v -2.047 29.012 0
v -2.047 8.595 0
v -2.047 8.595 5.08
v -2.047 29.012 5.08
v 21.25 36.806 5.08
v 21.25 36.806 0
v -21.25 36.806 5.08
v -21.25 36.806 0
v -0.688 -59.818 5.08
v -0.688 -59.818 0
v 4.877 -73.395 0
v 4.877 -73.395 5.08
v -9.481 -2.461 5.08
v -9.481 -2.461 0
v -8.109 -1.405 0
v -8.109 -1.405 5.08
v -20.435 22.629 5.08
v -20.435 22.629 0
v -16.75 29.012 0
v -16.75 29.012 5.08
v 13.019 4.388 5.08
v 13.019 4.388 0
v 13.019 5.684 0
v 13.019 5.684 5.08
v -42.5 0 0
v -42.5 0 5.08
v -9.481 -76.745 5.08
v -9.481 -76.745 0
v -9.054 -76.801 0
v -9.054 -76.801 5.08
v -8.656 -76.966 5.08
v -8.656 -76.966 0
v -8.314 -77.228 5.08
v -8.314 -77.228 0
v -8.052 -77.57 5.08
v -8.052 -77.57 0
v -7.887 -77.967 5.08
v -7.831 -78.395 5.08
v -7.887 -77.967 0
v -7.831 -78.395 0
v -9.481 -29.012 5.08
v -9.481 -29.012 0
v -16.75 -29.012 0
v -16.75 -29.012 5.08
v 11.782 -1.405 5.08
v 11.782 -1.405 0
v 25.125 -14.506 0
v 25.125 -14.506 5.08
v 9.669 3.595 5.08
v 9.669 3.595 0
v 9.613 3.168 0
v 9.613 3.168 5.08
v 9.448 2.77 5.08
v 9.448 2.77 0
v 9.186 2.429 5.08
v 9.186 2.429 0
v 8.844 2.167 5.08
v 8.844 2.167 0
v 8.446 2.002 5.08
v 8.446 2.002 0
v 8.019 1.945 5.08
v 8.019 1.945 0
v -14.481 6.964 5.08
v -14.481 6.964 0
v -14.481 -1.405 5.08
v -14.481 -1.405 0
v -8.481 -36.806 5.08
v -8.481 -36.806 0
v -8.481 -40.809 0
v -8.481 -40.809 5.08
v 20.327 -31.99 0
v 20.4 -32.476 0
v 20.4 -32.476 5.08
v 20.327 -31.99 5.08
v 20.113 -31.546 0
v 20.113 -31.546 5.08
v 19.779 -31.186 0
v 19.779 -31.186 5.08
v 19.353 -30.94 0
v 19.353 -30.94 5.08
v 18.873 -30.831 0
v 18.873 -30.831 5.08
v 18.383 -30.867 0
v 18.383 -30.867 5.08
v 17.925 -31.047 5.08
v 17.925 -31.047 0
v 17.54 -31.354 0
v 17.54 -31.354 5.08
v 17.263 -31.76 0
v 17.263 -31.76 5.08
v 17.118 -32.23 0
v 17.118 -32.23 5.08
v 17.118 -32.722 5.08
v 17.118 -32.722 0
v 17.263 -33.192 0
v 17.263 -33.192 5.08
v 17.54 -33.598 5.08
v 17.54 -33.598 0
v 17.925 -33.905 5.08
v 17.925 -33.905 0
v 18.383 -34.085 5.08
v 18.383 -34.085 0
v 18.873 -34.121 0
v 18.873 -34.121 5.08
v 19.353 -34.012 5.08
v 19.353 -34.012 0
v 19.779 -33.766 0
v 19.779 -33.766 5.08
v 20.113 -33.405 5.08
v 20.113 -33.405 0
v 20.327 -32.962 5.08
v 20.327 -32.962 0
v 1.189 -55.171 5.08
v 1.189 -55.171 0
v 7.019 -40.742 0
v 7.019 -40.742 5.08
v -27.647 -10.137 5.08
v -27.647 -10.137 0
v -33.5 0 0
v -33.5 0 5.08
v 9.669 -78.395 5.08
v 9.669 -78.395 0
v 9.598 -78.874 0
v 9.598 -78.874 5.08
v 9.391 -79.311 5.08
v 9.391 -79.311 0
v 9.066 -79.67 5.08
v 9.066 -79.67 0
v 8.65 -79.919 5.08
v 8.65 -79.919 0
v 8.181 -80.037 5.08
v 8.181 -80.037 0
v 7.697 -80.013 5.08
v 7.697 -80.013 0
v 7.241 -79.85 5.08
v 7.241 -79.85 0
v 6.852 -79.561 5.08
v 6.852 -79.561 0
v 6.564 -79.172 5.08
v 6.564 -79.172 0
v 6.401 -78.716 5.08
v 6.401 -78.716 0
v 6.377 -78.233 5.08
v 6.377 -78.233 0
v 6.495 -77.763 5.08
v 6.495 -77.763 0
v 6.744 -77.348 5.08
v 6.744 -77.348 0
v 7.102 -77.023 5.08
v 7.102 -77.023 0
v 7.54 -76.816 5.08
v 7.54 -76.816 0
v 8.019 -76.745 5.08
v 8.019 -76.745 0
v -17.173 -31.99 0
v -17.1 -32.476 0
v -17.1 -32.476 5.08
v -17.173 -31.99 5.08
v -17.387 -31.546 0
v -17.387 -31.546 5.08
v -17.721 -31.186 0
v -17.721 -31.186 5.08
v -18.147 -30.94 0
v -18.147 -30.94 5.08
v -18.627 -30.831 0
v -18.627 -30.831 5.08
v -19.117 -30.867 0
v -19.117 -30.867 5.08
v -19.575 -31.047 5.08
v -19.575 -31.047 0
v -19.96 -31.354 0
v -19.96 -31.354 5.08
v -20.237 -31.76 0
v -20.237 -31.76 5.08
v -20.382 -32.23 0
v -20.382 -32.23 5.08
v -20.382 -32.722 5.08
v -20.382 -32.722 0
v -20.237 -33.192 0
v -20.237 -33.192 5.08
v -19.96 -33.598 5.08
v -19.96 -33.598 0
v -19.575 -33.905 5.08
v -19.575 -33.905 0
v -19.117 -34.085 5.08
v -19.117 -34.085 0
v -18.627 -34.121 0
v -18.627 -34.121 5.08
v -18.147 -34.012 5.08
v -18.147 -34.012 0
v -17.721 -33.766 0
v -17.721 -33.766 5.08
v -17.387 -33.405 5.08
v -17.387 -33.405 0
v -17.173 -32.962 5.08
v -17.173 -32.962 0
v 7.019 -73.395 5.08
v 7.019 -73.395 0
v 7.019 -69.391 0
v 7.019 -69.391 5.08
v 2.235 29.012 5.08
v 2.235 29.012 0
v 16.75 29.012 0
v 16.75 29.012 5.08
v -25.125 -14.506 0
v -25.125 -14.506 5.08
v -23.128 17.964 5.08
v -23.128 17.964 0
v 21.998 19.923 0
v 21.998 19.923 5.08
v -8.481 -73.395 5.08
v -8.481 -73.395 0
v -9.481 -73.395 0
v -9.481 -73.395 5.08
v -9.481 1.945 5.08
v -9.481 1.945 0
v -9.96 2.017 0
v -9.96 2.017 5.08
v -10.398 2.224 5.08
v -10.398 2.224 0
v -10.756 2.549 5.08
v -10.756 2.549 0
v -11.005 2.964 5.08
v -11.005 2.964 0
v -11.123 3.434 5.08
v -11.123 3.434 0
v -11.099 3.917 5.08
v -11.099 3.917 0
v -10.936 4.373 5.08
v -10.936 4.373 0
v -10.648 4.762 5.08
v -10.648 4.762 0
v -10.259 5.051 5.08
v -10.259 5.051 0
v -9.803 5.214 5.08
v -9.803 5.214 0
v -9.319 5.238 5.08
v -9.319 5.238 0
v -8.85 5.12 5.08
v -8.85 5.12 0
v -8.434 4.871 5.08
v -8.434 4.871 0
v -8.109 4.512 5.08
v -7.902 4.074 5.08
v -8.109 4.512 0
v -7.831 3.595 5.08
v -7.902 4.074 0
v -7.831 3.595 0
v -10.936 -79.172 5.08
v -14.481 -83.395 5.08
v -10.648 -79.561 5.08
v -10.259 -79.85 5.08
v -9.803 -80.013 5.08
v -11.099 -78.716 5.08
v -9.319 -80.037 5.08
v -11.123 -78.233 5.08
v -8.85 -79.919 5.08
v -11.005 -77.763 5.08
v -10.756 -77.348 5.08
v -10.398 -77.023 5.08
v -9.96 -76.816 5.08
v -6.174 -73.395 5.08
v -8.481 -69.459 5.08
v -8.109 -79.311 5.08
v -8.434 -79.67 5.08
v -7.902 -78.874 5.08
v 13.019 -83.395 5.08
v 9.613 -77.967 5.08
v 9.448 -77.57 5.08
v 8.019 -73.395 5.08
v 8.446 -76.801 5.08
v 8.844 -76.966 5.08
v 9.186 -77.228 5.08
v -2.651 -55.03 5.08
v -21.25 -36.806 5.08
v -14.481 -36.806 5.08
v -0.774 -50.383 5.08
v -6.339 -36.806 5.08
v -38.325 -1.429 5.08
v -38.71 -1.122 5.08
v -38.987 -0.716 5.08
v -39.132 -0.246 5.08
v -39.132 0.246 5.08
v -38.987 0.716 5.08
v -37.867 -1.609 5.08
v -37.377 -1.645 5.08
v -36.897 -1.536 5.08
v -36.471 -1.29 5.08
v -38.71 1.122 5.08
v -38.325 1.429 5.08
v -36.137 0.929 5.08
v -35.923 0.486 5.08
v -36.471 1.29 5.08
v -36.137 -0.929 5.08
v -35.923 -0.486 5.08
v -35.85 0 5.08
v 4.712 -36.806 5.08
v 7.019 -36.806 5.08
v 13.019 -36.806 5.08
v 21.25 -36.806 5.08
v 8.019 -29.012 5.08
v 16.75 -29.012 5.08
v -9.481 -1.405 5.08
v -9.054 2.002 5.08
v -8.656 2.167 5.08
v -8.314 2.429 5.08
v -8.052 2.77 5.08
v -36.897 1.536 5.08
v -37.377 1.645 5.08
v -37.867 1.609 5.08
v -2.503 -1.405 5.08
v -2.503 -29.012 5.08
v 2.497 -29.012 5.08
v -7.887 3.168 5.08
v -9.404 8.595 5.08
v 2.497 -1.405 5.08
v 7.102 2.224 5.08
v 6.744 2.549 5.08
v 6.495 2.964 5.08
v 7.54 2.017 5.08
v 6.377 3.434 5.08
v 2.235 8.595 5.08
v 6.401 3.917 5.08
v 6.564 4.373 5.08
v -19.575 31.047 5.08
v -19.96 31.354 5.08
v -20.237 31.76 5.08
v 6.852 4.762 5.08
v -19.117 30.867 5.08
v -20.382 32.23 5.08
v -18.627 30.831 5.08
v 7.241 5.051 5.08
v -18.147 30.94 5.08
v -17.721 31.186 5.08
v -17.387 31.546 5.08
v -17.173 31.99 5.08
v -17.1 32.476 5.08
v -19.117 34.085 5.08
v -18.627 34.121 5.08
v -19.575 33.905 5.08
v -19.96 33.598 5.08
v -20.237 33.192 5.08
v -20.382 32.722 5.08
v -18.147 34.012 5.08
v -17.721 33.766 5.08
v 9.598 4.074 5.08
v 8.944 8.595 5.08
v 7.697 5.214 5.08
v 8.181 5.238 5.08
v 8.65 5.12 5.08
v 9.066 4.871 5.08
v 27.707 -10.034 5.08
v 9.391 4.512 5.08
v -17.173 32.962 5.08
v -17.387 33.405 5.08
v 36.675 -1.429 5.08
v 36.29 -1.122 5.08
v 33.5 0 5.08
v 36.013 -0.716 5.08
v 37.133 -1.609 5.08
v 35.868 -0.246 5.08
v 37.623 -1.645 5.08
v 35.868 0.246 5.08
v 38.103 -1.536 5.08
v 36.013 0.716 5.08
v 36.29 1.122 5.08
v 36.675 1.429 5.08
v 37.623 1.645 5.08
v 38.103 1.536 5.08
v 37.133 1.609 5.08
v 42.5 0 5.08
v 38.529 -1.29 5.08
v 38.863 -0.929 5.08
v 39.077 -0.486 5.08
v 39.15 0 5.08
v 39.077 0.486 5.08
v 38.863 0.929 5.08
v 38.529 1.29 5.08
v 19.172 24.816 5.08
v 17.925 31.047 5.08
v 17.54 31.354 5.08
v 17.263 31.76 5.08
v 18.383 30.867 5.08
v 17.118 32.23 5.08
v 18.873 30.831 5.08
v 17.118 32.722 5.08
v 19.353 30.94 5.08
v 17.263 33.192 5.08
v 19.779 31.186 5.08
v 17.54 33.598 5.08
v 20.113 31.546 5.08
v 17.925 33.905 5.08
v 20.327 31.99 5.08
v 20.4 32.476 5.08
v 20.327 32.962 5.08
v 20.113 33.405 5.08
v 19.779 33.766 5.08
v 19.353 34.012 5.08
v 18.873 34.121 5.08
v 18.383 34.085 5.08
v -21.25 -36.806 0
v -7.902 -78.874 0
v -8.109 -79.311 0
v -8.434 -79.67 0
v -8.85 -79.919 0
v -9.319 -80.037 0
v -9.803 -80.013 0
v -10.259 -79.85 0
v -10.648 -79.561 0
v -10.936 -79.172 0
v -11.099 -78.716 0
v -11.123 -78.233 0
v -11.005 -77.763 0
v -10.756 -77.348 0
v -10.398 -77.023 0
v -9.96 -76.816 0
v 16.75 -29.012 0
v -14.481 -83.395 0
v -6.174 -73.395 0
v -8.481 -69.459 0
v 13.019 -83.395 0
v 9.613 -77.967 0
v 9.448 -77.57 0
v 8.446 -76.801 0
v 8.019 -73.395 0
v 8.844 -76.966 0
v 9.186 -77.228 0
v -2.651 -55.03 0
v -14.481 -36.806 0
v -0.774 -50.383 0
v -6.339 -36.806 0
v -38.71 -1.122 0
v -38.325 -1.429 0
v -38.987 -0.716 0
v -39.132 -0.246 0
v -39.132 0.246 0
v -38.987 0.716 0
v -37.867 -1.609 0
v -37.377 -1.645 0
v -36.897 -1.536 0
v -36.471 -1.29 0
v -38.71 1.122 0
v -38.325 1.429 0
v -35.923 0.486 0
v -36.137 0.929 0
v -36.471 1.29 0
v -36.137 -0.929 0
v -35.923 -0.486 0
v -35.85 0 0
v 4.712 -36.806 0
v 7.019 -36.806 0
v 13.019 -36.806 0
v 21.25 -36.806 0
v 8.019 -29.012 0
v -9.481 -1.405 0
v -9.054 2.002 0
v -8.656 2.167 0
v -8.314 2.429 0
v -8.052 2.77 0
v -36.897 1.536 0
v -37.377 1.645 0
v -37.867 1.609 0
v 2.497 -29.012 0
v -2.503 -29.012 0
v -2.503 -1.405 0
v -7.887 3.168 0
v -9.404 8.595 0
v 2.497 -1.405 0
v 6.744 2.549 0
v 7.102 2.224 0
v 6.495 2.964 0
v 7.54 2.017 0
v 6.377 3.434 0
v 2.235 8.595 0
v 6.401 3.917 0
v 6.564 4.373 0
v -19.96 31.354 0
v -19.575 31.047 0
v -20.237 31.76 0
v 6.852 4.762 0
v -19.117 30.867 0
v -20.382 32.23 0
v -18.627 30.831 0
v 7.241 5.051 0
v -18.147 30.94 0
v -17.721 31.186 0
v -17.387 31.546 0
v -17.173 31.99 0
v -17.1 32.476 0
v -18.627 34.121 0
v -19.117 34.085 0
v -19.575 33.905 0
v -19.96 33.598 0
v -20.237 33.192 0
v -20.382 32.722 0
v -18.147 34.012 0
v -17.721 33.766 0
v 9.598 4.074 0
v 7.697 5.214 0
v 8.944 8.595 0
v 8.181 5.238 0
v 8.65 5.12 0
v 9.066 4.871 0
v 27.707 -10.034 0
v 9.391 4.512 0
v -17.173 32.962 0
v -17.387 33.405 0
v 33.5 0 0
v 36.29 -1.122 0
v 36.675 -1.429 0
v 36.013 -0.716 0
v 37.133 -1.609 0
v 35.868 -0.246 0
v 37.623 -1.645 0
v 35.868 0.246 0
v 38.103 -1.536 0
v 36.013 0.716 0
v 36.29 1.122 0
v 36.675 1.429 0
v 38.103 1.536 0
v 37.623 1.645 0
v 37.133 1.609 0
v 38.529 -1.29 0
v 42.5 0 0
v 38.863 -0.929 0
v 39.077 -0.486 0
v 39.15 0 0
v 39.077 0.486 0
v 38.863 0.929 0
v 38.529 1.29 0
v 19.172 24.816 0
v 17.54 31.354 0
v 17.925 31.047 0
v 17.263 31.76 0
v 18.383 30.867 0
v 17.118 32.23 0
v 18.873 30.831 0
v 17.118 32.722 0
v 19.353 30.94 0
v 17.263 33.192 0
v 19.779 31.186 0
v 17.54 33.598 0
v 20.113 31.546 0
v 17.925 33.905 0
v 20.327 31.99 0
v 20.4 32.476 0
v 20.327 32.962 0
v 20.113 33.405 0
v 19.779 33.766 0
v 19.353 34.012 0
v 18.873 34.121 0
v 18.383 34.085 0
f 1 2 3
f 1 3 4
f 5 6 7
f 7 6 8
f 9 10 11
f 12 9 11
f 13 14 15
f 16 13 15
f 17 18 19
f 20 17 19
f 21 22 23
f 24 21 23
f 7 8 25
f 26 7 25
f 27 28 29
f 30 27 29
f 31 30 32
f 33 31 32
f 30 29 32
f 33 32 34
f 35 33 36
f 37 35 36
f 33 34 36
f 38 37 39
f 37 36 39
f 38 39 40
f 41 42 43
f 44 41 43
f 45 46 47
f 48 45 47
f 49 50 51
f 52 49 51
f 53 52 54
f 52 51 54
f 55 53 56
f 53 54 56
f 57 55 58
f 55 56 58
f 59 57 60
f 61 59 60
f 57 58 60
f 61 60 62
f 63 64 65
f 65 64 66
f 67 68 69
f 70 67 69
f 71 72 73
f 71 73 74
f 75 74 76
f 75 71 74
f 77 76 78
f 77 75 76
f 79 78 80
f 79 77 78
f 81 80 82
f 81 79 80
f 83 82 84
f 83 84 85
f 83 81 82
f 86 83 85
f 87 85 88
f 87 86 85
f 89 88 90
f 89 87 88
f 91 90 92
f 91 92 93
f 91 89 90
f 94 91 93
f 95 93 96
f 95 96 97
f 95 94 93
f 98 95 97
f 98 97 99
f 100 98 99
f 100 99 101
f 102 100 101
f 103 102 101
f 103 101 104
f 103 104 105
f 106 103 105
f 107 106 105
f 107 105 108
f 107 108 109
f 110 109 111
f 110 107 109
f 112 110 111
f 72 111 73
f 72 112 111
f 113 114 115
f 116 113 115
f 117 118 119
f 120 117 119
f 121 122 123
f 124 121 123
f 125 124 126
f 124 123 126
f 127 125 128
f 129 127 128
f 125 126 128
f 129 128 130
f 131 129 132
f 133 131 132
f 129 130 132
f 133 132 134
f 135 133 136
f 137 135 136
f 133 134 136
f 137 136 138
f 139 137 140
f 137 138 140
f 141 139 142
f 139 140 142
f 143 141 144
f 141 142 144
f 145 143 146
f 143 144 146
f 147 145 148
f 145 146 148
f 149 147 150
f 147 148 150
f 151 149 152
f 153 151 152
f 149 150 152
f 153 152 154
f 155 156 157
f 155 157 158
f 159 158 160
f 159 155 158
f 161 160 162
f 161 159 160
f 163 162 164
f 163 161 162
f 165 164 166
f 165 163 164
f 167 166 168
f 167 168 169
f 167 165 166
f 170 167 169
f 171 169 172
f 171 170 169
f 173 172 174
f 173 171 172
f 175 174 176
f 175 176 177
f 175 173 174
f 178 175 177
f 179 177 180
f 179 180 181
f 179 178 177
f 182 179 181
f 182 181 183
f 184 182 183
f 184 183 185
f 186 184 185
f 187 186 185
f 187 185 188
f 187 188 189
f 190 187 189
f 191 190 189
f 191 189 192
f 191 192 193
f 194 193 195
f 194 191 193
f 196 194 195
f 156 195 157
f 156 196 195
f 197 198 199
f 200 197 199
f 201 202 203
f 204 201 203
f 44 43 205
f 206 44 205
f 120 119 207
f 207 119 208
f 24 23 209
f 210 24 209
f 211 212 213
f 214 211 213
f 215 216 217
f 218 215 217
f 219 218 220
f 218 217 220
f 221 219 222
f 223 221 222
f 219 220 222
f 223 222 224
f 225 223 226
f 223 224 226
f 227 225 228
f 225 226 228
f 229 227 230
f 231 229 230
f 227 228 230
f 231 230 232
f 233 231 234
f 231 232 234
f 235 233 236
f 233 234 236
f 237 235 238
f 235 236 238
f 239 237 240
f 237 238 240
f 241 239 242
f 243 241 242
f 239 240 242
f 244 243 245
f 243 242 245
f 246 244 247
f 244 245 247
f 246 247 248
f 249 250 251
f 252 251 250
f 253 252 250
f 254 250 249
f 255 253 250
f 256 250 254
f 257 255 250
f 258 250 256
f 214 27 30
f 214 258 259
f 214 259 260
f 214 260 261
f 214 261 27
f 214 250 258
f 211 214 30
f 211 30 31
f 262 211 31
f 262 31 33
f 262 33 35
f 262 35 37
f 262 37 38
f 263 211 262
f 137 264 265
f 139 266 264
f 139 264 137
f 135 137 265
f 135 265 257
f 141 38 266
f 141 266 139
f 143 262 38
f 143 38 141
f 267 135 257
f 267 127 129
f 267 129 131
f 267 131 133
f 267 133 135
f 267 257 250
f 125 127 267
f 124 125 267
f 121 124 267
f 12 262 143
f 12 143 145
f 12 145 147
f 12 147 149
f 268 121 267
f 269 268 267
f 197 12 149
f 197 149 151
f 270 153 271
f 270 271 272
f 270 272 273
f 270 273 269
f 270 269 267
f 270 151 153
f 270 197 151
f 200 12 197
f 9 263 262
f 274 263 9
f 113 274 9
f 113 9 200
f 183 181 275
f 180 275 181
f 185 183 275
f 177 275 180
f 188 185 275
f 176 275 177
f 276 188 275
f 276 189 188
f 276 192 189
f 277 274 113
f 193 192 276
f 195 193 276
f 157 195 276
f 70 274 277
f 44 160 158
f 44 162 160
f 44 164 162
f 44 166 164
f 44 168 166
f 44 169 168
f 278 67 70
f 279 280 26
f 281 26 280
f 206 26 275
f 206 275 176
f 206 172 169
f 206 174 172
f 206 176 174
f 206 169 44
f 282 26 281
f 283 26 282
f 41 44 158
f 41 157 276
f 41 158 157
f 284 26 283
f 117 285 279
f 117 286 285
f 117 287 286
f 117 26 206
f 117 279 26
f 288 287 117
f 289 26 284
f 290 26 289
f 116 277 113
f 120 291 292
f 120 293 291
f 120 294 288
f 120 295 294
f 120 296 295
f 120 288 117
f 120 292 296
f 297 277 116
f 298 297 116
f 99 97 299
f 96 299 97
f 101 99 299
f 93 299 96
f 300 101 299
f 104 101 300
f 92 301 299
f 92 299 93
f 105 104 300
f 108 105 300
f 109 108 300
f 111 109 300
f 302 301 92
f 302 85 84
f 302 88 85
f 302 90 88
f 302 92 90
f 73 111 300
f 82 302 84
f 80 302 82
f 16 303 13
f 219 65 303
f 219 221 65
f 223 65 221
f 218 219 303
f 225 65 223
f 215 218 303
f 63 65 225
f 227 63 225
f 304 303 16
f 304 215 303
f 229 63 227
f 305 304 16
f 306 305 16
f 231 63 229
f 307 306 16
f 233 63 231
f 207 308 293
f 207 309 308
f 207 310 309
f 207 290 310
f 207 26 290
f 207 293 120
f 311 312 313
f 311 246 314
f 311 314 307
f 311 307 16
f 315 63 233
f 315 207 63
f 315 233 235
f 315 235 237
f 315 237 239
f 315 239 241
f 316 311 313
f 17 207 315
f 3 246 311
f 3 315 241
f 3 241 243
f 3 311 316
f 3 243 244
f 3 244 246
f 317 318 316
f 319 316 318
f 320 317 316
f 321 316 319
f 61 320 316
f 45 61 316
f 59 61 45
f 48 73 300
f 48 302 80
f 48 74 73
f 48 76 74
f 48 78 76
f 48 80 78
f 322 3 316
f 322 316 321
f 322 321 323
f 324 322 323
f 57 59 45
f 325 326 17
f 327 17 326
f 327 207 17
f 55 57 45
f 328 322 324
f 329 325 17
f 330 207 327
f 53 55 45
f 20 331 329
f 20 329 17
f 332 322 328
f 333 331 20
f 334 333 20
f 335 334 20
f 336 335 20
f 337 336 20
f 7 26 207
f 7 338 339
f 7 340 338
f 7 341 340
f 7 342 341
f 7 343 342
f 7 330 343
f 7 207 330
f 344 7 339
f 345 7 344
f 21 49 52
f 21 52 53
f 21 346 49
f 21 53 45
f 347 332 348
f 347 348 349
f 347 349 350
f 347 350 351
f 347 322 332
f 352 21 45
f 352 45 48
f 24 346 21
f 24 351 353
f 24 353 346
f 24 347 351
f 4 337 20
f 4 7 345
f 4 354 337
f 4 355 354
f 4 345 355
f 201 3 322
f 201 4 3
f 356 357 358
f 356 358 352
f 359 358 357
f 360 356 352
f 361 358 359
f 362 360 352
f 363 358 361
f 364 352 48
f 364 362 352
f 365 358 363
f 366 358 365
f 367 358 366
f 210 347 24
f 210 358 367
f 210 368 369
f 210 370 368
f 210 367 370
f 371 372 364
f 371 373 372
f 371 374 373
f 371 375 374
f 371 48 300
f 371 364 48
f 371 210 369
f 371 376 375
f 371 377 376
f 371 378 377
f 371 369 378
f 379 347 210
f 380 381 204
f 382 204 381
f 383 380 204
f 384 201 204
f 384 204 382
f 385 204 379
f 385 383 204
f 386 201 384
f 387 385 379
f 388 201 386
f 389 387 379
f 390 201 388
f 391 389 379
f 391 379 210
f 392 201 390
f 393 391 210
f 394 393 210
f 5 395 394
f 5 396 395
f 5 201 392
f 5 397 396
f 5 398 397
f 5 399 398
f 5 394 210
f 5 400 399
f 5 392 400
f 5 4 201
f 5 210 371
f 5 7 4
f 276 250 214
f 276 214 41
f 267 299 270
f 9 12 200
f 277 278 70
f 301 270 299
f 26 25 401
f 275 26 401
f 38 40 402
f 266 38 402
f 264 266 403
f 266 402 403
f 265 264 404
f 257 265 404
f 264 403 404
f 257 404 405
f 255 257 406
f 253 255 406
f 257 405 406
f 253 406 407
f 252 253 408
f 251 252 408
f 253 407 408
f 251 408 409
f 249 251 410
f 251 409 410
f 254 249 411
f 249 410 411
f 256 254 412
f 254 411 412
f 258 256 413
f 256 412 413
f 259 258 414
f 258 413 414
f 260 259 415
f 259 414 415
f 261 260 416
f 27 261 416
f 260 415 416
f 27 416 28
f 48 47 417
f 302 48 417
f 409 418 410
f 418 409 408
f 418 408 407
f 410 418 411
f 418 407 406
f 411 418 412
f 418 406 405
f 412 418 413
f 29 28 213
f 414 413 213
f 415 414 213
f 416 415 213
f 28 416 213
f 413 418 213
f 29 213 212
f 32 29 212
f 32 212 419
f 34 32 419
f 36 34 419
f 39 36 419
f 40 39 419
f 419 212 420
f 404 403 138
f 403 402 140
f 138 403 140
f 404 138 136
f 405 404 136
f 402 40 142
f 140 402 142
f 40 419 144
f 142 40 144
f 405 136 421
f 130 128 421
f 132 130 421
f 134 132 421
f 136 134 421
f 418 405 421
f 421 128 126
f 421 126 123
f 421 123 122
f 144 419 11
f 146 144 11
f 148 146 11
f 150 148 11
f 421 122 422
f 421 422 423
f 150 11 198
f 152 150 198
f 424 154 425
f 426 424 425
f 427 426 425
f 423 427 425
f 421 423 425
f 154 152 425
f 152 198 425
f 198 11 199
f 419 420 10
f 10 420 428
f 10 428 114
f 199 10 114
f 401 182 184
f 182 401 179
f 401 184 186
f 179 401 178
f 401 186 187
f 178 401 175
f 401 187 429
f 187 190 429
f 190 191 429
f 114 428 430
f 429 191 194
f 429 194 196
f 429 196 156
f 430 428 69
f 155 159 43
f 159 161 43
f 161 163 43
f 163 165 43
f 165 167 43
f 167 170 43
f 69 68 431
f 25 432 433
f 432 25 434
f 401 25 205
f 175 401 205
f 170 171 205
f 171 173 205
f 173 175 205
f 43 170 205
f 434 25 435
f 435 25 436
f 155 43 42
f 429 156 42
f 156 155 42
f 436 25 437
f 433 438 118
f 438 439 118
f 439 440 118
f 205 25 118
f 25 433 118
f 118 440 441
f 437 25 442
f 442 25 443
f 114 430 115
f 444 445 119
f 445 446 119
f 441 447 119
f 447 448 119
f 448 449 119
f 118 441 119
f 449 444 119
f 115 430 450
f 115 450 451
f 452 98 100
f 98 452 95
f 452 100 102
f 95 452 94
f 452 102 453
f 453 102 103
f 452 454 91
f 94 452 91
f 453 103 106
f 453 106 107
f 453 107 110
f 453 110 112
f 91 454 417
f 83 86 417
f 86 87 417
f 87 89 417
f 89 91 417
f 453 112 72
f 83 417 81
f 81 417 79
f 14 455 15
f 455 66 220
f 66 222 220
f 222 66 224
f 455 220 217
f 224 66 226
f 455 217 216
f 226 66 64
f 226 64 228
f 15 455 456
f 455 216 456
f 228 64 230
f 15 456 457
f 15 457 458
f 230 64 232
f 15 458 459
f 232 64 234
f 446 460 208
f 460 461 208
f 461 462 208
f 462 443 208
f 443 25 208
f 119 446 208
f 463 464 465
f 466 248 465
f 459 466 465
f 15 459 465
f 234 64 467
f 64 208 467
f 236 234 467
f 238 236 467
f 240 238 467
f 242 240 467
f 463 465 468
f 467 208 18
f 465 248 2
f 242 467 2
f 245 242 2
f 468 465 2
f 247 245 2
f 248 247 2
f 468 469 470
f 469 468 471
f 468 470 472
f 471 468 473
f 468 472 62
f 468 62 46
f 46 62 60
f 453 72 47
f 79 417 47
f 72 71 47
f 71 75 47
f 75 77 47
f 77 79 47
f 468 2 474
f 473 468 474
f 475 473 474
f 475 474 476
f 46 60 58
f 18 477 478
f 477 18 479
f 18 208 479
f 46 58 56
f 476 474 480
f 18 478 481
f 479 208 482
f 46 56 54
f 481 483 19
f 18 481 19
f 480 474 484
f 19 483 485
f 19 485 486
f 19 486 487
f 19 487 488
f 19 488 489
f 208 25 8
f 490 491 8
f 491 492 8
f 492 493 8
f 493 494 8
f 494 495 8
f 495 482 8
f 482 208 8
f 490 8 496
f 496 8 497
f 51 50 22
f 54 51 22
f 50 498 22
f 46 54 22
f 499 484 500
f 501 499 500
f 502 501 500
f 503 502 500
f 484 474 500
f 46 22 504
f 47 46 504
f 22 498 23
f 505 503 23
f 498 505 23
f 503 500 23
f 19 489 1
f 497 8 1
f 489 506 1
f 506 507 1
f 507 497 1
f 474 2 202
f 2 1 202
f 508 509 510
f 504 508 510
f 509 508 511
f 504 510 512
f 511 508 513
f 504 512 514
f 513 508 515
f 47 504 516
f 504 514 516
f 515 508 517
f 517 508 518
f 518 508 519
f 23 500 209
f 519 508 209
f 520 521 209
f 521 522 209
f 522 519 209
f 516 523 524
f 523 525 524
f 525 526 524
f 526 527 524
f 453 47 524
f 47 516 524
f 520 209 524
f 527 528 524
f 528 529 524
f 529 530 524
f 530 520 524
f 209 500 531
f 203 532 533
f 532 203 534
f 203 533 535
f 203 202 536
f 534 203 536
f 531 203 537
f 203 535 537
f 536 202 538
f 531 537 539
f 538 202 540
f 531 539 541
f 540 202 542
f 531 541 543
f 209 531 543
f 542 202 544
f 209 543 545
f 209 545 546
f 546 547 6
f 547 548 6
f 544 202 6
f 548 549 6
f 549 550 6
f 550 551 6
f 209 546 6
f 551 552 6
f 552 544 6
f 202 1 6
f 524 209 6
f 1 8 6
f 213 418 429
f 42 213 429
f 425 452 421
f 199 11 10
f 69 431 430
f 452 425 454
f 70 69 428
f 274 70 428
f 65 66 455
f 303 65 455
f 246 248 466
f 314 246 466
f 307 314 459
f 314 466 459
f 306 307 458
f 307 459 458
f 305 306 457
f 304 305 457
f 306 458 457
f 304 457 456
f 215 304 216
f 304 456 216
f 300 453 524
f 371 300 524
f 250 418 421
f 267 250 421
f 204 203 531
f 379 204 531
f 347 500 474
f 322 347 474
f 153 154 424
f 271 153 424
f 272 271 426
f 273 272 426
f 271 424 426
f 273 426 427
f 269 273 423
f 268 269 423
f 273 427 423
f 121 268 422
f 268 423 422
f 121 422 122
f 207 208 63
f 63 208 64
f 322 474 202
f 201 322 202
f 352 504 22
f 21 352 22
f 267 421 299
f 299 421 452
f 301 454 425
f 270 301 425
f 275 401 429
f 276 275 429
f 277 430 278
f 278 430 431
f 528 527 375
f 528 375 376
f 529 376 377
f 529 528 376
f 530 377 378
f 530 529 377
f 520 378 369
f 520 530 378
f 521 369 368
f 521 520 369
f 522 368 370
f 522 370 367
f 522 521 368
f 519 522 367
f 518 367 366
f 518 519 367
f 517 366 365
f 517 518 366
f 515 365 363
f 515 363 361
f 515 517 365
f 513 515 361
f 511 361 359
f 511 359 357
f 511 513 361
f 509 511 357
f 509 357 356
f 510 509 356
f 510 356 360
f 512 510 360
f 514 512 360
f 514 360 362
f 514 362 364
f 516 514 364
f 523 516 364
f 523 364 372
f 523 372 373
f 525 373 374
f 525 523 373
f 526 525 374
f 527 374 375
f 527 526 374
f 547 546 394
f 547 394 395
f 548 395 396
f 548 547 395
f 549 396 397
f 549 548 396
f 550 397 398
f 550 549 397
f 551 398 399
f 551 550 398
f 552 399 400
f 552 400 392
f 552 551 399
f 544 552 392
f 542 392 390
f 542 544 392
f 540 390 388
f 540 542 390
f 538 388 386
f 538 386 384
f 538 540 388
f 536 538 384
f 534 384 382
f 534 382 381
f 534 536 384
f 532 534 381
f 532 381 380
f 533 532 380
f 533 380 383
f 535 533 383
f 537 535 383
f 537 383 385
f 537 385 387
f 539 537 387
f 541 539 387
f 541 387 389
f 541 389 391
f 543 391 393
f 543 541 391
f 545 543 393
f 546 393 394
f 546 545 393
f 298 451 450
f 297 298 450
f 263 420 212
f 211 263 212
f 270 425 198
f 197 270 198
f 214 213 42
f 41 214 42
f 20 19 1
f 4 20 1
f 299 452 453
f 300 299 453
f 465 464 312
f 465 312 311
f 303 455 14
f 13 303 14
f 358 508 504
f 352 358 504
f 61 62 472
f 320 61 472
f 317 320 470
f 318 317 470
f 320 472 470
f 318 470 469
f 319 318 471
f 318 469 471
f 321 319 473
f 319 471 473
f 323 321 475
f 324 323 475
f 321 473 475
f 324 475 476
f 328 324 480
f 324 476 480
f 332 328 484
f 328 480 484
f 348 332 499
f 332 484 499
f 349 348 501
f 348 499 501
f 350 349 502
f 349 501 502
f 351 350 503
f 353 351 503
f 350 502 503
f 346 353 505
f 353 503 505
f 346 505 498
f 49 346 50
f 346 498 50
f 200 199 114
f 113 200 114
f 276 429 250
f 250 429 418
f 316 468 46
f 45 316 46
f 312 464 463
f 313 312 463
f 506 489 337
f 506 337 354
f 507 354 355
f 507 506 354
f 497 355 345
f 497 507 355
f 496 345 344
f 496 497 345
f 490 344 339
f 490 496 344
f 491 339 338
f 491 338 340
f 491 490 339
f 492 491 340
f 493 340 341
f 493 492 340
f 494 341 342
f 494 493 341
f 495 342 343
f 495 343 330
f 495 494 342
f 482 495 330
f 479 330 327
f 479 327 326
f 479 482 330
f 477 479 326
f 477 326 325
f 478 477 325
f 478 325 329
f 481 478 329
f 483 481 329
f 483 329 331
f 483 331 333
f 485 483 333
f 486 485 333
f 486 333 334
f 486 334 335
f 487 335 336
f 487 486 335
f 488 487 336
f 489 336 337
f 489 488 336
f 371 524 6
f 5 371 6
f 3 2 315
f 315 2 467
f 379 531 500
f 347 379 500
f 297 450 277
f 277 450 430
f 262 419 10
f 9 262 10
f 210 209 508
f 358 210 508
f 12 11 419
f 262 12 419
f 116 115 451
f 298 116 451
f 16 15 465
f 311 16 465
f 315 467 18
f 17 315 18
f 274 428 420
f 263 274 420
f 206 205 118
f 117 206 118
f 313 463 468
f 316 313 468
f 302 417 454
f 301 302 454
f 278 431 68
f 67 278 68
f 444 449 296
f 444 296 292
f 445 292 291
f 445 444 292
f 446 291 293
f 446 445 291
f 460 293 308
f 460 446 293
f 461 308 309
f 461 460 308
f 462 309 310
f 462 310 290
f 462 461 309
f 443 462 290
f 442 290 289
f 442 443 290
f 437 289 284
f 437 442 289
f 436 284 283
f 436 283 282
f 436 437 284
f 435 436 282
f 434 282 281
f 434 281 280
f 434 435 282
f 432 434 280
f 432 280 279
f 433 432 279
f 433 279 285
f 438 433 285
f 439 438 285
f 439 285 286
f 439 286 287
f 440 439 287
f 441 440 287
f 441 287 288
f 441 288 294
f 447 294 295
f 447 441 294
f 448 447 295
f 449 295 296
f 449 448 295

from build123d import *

# Parameters (mm, degrees)
F0_R     = 1.65
F0_W     = 5
F0_H     = 36.5884533238
F0_H_2   = 27.6073180421
F0_W_2   = 4.2823543772
F0_H_3   = 20.4163840114
F1_DEPTH = 5.08


# Not quite as in the source:
# - a feature names something its author has since deleted; it is built from what else it names


with BuildPart() as f1:
    # F0 (on Top) → F1 (new body)
    with BuildSketch(Plane.XY):
        Polygon((21.25, 36.8060796608), (-21.25, 36.8060796608), (-42.5, 0), (-21.25, -36.8060796608), (-14.481, -36.8060796608), (-9.481, -36.8060796608), (-9.481, -29.0118510268), (-16.75, -29.0118510268), (-25.125, -14.5059255134), (-27.6471267629, -10.137473817), (-33.5, 0), (-23.128253194, 17.9643924312), (-20.4351344929, 22.6290108523), (-16.75, 29.0118510268), (-2.0468940441, 29.0118510268), (2.2354603331, 29.0118510268), (16.75, 29.0118510268), (19.1722516141, 24.8163881624), (21.9975489559, 19.92282962), (33.5, 0), (27.7069725582, -10.0338178588), (25.125, -14.5059255134), (16.75, -29.0118510268), (8.019, -29.0118510268), (8.019, -36.8060796608), (13.019, -36.8060796608), (21.25, -36.8060796608), (42.5, 0), align=None)
        with Locations((-18.75, -32.4759526419)):
            Circle(F0_R, mode=Mode.SUBTRACT)
        with Locations((18.75, -32.4759526419)):
            Circle(F0_R, mode=Mode.SUBTRACT)
        with Locations((-37.5, 0)):
            Circle(F0_R, mode=Mode.SUBTRACT)
        with Locations((-18.75, 32.4759526419)):
            Circle(F0_R, mode=Mode.SUBTRACT)
        with Locations((37.5, 0)):
            Circle(F0_R, mode=Mode.SUBTRACT)
        with Locations((18.75, 32.4759526419)):
            Circle(F0_R, mode=Mode.SUBTRACT)
        with Locations((-11.981, -55.1003063227)):
            Rectangle(F0_W, F0_H)
        with Locations((10.519, -55.1003063227)):
            Rectangle(F0_W, F0_H)
        Polygon((-9.481, -73.3945329846), (-14.481, -73.3945329846), (-14.481, -83.3945329846), (13.019, -83.3945329846), (13.019, -73.3945329846), (8.019, -73.3945329846), (7.019, -73.3945329846), (4.8774445356, -73.3945329846), (-6.1735640291, -73.3945329846), (-8.481, -73.3945329846), align=None)
        with BuildLine():
            ThreePointArc((-7.831, -78.3945329846), (-10.647726189, -79.5612591736), (-9.481, -76.7445329846))
            ThreePointArc((-9.481, -76.7445329846), (-8.314273811, -77.2278067957), (-7.831, -78.3945329846))
        make_face(mode=Mode.SUBTRACT)
        with BuildLine():
            ThreePointArc((9.669, -78.3945329846), (6.852273811, -79.5612591736), (8.019, -76.7445329846))
            ThreePointArc((8.019, -76.7445329846), (9.185726189, -77.2278067957), (9.669, -78.3945329846))
        make_face(mode=Mode.SUBTRACT)
        Polygon((-6.3394445356, -36.8060796608), (-8.481, -36.8060796608), (-8.481, -40.8093024077), (-2.6512739295, -55.0297430961), (-0.7737012417, -50.3825876202), align=None)
        Polygon((7.019, -40.7417911932), (7.019, -36.8060796608), (4.7115640291, -36.8060796608), (-0.7737012417, -50.3825876202), (1.1892739295, -55.1708695493), align=None)
        with Locations((-0.002691932, -15.2081920057)):
            Rectangle(F0_W, F0_H_2)
        Polygon((-9.481, -1.4045329846), (-9.481, -2.4605728254), (-8.1094596477, -1.4045329846), align=None)
        Polygon((-8.481, -69.4588214522), (-8.481, -73.3945329846), (-6.1735640291, -73.3945329846), (-0.6882987583, -59.8180250252), (-2.6512739295, -55.0297430961), align=None)
        Polygon((4.8774445356, -73.3945329846), (7.019, -73.3945329846), (7.019, -69.3913102377), (1.1892739295, -55.1708695493), (-0.6882987583, -59.8180250252), align=None)
        Polygon((2.497308068, -1.4045329846), (8.019, -1.4045329846), (11.781800831, -1.4045329846), (13.019, -1.4045329846), (13.019, 4.3879779564), (13.019, 5.6842228109), (13.019, 8.5954670154), (8.9436992999, 8.5954670154), (2.2354603331, 8.5954670154), (-2.0468940441, 8.5954670154), (-9.4036843662, 8.5954670154), (-14.481, 8.5954670154), (-14.481, 6.9638797721), (-14.481, 0), (-14.481, -1.4045329846), (-9.481, -1.4045329846), (-8.1094596477, -1.4045329846), (-2.502691932, -1.4045329846), align=None)
        with BuildLine():
            ThreePointArc((-7.831, 3.5954670154), (-8.314273811, 2.4287408264), (-9.481, 1.9454670154))
            ThreePointArc((-9.481, 1.9454670154), (-10.647726189, 4.7621932043), (-7.831, 3.5954670154))
        make_face(mode=Mode.SUBTRACT)
        with BuildLine():
            ThreePointArc((9.669, 3.5954670154), (9.185726189, 2.4287408264), (8.019, 1.9454670154))
            ThreePointArc((8.019, 1.9454670154), (6.852273811, 4.7621932043), (9.669, 3.5954670154))
        make_face(mode=Mode.SUBTRACT)
        Polygon((1.1892739295, -55.1708695493), (-0.7737012417, -50.3825876202), (-2.6512739295, -55.0297430961), (-0.6882987583, -59.8180250252), align=None)
        Polygon((11.781800831, -1.4045329846), (25.125, -14.5059255134), (27.7069725582, -10.0338178588), (13.019, 4.3879779564), (13.019, -1.4045329846), align=None)
        Polygon((-20.4351344929, 22.6290108523), (-23.128253194, 17.9643924312), (-14.481, 6.9638797721), (-14.481, 8.5954670154), (-9.4036843662, 8.5954670154), align=None)
        Polygon((13.019, 5.6842228109), (21.9975489559, 19.92282962), (19.1722516141, 24.8163881624), (8.9436992999, 8.5954670154), (13.019, 8.5954670154), align=None)
        with Locations((0.0942831445, 18.8036590211)):
            Rectangle(F0_W_2, F0_H_3)
    extrude(amount=F1_DEPTH)


solid = f1.part
